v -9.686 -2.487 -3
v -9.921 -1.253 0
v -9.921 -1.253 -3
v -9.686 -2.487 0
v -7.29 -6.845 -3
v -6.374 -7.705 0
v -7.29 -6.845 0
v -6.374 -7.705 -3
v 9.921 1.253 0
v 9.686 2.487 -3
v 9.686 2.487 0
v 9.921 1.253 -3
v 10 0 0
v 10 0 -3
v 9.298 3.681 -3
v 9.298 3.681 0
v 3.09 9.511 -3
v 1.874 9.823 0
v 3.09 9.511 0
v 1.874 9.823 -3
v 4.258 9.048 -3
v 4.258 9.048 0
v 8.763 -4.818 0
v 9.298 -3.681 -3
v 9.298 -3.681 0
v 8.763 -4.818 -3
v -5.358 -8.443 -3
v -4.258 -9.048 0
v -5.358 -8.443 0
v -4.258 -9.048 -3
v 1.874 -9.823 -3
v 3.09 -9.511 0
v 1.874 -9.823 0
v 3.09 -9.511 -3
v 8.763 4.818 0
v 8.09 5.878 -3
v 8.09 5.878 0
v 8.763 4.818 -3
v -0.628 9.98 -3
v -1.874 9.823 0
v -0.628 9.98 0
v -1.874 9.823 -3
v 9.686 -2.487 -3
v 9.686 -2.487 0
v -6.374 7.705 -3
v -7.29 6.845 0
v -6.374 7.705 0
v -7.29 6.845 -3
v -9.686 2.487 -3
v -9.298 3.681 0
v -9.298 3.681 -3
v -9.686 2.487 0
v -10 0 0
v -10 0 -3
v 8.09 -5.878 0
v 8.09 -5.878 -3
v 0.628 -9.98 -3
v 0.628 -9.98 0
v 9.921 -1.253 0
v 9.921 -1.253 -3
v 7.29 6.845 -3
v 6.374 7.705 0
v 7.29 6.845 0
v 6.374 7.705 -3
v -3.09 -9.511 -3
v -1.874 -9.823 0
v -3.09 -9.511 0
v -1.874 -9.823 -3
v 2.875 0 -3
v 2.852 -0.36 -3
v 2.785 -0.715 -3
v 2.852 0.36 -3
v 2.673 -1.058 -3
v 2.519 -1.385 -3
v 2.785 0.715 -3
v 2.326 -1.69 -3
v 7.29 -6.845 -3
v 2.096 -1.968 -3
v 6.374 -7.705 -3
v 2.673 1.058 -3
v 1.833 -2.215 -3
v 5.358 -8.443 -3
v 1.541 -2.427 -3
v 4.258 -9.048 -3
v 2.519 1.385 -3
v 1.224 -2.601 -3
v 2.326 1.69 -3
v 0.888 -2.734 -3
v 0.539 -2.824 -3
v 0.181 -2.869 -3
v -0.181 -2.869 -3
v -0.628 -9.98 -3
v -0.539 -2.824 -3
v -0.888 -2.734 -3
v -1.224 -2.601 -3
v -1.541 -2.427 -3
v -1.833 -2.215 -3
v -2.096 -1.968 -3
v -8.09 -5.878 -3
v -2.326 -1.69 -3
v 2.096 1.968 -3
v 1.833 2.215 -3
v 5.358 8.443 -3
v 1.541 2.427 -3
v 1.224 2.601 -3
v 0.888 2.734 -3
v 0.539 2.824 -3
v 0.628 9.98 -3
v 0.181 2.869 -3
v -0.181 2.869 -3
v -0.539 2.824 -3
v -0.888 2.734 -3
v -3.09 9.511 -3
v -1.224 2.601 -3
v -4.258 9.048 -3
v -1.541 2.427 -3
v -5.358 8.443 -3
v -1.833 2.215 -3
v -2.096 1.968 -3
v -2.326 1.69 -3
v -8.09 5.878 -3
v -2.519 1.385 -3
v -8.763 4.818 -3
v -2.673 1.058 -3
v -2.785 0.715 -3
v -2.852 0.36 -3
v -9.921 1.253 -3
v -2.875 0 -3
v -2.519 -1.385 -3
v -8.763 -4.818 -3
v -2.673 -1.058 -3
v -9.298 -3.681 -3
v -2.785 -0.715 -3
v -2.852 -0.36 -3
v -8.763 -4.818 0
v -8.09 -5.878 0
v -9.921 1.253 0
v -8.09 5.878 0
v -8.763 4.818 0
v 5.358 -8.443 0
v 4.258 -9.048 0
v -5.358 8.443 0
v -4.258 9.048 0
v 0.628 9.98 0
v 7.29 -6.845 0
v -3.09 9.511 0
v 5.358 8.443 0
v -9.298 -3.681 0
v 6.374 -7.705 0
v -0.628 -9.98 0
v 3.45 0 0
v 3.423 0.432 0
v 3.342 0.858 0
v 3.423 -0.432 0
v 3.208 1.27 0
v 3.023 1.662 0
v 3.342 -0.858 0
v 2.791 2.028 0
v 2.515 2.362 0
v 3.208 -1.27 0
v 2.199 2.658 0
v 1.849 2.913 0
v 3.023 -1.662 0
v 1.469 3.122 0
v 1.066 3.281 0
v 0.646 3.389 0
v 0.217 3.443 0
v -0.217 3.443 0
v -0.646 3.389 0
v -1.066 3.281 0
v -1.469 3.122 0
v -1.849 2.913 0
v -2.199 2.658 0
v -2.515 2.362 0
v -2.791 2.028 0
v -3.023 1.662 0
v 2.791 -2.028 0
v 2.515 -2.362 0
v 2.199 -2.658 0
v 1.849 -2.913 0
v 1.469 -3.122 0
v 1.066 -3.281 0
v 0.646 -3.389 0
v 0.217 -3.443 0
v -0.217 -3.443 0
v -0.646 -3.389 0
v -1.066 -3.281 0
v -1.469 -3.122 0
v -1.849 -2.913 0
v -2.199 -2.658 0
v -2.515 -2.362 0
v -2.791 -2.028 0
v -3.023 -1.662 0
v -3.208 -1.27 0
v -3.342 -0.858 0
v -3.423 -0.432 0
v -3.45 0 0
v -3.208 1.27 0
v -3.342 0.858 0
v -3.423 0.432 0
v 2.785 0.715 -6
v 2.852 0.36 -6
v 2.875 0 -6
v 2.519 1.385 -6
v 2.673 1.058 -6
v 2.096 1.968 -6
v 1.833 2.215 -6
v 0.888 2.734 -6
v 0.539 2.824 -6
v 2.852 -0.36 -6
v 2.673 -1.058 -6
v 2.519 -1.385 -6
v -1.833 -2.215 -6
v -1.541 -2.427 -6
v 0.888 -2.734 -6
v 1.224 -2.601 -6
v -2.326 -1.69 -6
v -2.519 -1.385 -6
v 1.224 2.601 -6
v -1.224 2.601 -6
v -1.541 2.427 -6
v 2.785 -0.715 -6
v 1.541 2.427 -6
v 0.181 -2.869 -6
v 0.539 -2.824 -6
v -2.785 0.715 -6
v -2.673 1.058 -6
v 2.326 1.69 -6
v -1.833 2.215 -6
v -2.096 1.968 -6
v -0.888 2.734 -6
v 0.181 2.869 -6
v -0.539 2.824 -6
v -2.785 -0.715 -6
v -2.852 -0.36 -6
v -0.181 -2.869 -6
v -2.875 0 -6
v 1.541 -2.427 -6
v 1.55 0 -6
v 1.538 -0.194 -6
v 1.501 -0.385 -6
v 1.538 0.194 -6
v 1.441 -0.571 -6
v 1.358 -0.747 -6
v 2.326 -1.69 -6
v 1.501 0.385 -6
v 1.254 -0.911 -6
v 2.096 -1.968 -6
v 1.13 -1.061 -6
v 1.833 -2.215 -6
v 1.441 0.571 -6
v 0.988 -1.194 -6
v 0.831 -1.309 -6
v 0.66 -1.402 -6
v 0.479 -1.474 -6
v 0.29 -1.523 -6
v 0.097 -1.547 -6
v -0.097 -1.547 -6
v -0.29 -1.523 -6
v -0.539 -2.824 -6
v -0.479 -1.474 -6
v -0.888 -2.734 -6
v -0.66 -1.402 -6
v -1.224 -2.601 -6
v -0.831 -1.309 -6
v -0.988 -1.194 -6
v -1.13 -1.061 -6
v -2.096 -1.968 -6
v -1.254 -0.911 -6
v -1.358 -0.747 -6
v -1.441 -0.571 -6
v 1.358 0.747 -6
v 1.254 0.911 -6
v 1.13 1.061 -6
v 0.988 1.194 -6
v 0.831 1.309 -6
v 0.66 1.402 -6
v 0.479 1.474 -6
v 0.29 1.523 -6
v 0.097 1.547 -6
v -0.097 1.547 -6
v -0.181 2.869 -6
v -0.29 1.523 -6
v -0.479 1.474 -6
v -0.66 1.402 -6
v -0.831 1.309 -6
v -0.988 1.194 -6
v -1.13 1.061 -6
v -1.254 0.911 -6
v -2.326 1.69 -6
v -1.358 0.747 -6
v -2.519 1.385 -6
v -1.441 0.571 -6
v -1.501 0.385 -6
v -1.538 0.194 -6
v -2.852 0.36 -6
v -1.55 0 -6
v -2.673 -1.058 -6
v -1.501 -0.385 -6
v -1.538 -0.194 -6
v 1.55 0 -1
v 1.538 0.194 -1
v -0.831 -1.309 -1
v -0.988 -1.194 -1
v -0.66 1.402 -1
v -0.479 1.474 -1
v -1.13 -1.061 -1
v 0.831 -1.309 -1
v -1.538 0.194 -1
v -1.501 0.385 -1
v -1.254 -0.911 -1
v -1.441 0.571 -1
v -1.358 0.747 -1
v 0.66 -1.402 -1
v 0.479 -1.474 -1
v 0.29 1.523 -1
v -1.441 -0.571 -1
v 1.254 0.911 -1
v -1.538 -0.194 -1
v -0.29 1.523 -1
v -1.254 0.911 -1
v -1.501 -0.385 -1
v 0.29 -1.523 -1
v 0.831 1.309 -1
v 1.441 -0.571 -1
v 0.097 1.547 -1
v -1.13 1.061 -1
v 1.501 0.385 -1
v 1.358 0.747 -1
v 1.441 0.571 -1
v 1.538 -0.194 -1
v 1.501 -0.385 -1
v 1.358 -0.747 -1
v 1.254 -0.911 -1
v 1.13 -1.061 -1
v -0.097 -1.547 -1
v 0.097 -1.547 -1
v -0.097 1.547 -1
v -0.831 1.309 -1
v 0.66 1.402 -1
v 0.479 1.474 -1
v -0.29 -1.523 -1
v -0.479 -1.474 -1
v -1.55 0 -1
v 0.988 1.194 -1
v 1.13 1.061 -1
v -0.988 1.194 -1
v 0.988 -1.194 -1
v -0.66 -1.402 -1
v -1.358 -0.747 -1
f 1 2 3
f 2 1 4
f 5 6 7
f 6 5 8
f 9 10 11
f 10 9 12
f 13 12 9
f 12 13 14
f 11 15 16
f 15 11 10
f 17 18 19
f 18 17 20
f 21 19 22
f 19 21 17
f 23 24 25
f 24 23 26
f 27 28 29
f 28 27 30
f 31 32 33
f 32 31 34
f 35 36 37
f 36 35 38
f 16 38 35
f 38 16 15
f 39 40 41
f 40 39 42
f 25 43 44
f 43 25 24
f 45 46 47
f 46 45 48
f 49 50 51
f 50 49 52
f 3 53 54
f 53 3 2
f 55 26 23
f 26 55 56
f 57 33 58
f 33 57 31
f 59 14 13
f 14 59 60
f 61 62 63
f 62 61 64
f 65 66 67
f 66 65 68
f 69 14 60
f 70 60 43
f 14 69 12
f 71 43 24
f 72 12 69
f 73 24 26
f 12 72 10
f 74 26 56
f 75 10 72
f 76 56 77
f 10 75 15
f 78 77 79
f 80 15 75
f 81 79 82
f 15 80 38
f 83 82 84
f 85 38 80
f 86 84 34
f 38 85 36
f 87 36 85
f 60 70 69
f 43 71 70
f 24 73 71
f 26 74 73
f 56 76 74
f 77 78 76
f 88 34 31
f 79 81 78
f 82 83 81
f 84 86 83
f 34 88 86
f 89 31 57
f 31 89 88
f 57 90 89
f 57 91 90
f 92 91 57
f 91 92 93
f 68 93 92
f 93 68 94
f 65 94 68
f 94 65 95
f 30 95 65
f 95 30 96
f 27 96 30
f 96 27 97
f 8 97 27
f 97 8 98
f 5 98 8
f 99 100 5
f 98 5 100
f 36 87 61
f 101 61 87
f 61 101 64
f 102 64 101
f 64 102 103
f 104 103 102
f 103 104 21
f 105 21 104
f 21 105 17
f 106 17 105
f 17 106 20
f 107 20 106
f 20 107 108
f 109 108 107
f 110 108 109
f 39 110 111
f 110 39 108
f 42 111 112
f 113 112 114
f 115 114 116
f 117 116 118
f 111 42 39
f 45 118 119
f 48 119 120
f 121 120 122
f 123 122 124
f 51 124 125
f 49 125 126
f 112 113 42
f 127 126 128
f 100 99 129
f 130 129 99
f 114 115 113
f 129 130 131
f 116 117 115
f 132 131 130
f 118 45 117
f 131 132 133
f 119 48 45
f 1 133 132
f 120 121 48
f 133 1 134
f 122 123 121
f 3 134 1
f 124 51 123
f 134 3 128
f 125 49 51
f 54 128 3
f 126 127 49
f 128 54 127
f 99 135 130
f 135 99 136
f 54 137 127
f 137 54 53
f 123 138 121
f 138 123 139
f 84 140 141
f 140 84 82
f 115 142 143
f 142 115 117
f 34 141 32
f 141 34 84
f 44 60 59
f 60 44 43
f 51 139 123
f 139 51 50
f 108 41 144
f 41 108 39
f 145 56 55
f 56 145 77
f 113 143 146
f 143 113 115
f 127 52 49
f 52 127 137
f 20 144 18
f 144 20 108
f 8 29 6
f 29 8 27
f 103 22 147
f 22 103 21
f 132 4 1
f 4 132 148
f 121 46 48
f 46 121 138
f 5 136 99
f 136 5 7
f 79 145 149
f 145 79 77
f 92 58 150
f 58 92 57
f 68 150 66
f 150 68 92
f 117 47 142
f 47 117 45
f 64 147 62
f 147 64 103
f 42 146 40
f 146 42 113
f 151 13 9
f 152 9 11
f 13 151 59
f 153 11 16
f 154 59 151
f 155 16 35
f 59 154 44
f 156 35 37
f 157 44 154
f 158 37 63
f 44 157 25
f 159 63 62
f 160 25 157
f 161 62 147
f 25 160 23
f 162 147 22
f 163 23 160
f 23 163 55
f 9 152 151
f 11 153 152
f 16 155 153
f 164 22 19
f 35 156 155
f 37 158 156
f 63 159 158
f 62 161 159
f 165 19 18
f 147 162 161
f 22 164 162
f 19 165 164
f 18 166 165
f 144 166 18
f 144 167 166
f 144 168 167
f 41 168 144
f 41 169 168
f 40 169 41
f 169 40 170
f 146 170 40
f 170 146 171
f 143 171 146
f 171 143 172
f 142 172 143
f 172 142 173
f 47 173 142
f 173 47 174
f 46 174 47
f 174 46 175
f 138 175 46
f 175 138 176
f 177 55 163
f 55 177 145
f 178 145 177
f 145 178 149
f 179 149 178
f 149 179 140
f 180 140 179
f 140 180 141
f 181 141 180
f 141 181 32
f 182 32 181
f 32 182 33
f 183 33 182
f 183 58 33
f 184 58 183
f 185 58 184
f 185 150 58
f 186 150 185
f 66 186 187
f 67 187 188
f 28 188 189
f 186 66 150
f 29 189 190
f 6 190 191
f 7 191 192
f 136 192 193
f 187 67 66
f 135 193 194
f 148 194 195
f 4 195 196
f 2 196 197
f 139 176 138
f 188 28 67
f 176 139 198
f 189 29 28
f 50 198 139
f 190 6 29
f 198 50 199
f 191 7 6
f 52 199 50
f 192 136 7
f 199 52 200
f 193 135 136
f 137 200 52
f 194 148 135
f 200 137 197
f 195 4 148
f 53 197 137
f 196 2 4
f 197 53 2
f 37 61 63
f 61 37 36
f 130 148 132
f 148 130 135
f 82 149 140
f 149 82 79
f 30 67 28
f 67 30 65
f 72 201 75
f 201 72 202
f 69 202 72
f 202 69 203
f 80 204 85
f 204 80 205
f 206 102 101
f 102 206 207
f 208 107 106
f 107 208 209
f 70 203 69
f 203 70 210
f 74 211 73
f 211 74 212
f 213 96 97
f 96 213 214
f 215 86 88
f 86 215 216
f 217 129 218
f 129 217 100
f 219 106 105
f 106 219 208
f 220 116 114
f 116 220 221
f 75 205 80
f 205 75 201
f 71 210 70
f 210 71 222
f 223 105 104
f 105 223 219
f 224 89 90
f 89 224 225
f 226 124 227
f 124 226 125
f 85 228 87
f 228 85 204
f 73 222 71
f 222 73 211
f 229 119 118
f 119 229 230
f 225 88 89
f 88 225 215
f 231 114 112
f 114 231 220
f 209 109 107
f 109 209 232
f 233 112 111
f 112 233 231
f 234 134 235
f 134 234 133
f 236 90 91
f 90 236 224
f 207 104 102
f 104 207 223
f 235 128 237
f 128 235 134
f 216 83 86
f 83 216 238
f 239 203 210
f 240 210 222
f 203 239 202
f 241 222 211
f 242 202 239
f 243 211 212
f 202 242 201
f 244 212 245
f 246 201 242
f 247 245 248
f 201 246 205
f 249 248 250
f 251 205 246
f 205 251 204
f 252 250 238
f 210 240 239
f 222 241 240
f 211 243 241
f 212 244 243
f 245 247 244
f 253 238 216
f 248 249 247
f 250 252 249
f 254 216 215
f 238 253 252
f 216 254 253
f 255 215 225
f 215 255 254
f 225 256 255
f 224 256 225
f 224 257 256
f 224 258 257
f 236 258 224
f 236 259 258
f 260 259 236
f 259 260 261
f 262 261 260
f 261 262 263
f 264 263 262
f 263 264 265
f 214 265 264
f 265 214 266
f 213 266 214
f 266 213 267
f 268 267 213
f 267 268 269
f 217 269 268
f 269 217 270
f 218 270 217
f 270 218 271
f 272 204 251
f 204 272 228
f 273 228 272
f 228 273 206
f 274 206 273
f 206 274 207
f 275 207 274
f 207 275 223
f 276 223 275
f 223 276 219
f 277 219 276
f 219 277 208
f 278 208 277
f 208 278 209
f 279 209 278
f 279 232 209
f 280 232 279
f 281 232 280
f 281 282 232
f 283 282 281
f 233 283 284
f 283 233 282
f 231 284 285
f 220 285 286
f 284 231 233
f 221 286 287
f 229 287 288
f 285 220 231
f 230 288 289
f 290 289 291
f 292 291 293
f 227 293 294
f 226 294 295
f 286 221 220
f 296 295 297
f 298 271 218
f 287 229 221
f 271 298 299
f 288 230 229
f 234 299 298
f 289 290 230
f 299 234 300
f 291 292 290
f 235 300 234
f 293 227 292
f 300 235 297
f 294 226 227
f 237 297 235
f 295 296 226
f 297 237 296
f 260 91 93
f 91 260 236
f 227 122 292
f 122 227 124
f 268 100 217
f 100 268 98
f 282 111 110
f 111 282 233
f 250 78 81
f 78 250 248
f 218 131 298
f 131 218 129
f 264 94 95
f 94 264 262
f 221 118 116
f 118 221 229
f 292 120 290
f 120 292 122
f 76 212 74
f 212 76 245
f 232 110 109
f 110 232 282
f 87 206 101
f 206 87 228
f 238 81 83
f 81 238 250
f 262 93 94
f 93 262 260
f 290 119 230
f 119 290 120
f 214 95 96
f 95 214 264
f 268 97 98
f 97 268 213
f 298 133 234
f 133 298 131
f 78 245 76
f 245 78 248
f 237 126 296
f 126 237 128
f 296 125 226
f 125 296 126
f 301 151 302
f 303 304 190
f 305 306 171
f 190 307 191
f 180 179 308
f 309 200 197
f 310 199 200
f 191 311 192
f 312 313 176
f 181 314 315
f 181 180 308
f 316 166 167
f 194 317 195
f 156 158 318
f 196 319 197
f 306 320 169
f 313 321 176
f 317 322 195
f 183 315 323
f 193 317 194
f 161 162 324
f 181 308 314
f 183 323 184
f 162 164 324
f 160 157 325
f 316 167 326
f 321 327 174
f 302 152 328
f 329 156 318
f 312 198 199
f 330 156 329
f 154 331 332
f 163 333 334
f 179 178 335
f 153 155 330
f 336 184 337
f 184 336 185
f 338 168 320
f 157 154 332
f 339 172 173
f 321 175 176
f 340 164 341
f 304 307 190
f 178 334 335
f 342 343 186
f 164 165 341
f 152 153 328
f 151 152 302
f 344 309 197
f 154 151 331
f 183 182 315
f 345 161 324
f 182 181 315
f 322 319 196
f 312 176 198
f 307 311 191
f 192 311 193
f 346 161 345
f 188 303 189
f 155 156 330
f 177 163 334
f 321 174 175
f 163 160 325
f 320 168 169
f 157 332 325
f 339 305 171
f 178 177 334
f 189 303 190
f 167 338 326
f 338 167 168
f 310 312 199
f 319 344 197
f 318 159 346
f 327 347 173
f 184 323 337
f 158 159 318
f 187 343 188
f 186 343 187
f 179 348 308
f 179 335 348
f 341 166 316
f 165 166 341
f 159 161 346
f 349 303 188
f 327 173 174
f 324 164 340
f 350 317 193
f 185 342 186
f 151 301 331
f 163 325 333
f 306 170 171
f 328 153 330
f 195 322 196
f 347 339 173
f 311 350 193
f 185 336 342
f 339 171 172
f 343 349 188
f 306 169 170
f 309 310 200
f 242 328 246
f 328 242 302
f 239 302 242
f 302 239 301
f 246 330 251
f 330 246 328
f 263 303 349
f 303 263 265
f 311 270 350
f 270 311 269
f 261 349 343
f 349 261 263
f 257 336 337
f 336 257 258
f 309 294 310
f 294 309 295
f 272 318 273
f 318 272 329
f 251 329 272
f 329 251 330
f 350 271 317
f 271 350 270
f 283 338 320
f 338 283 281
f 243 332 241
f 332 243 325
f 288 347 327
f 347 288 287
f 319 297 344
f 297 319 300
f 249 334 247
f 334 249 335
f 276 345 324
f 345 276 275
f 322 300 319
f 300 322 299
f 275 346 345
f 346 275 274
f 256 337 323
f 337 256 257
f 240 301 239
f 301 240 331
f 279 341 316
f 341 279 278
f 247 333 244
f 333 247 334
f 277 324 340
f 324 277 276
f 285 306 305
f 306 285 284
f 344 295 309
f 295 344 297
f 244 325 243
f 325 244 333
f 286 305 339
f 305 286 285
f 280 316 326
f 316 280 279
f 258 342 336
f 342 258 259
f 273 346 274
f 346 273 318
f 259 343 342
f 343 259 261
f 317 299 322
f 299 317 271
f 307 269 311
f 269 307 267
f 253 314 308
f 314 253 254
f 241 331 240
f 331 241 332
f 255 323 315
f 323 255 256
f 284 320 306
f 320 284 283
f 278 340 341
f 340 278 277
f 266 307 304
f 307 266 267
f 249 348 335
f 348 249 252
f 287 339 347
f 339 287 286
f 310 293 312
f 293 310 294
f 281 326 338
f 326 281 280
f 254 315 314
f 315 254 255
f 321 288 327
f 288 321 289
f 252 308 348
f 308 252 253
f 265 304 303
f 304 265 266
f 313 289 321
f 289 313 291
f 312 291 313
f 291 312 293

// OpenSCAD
$fn = 50;


difference() {
	union() {
		translate(v = [0, 0, -3.0000000000]) {
			cylinder(h = 3, r = 10.0000000000);
		}
		#translate(v = [0, 0, -6.0000000000]) {
			cylinder(h = 6, r = 2.8750000000);
		}
	}
	union() {
		translate(v = [0, 0, 0]) {
			rotate(a = [0, 0, 0]) {
				difference() {
					union() {
						translate(v = [0, 0, -6.0000000000]) {
							cylinder(h = 6, r = 1.2500000000);
						}
						translate(v = [0, 0, -1.0000000000]) {
							cylinder(h = 1.0000000000, r1 = 1.5500000000, r2 = 3.4500000000);
						}
						translate(v = [0, 0, -6.0000000000]) {
							cylinder(h = 6, r = 1.5500000000);
						}
						translate(v = [0, 0, -6.0000000000]) {
							cylinder(h = 6, r = 1.2500000000);
						}
					}
					union();
				}
			}
		}
	}
}
